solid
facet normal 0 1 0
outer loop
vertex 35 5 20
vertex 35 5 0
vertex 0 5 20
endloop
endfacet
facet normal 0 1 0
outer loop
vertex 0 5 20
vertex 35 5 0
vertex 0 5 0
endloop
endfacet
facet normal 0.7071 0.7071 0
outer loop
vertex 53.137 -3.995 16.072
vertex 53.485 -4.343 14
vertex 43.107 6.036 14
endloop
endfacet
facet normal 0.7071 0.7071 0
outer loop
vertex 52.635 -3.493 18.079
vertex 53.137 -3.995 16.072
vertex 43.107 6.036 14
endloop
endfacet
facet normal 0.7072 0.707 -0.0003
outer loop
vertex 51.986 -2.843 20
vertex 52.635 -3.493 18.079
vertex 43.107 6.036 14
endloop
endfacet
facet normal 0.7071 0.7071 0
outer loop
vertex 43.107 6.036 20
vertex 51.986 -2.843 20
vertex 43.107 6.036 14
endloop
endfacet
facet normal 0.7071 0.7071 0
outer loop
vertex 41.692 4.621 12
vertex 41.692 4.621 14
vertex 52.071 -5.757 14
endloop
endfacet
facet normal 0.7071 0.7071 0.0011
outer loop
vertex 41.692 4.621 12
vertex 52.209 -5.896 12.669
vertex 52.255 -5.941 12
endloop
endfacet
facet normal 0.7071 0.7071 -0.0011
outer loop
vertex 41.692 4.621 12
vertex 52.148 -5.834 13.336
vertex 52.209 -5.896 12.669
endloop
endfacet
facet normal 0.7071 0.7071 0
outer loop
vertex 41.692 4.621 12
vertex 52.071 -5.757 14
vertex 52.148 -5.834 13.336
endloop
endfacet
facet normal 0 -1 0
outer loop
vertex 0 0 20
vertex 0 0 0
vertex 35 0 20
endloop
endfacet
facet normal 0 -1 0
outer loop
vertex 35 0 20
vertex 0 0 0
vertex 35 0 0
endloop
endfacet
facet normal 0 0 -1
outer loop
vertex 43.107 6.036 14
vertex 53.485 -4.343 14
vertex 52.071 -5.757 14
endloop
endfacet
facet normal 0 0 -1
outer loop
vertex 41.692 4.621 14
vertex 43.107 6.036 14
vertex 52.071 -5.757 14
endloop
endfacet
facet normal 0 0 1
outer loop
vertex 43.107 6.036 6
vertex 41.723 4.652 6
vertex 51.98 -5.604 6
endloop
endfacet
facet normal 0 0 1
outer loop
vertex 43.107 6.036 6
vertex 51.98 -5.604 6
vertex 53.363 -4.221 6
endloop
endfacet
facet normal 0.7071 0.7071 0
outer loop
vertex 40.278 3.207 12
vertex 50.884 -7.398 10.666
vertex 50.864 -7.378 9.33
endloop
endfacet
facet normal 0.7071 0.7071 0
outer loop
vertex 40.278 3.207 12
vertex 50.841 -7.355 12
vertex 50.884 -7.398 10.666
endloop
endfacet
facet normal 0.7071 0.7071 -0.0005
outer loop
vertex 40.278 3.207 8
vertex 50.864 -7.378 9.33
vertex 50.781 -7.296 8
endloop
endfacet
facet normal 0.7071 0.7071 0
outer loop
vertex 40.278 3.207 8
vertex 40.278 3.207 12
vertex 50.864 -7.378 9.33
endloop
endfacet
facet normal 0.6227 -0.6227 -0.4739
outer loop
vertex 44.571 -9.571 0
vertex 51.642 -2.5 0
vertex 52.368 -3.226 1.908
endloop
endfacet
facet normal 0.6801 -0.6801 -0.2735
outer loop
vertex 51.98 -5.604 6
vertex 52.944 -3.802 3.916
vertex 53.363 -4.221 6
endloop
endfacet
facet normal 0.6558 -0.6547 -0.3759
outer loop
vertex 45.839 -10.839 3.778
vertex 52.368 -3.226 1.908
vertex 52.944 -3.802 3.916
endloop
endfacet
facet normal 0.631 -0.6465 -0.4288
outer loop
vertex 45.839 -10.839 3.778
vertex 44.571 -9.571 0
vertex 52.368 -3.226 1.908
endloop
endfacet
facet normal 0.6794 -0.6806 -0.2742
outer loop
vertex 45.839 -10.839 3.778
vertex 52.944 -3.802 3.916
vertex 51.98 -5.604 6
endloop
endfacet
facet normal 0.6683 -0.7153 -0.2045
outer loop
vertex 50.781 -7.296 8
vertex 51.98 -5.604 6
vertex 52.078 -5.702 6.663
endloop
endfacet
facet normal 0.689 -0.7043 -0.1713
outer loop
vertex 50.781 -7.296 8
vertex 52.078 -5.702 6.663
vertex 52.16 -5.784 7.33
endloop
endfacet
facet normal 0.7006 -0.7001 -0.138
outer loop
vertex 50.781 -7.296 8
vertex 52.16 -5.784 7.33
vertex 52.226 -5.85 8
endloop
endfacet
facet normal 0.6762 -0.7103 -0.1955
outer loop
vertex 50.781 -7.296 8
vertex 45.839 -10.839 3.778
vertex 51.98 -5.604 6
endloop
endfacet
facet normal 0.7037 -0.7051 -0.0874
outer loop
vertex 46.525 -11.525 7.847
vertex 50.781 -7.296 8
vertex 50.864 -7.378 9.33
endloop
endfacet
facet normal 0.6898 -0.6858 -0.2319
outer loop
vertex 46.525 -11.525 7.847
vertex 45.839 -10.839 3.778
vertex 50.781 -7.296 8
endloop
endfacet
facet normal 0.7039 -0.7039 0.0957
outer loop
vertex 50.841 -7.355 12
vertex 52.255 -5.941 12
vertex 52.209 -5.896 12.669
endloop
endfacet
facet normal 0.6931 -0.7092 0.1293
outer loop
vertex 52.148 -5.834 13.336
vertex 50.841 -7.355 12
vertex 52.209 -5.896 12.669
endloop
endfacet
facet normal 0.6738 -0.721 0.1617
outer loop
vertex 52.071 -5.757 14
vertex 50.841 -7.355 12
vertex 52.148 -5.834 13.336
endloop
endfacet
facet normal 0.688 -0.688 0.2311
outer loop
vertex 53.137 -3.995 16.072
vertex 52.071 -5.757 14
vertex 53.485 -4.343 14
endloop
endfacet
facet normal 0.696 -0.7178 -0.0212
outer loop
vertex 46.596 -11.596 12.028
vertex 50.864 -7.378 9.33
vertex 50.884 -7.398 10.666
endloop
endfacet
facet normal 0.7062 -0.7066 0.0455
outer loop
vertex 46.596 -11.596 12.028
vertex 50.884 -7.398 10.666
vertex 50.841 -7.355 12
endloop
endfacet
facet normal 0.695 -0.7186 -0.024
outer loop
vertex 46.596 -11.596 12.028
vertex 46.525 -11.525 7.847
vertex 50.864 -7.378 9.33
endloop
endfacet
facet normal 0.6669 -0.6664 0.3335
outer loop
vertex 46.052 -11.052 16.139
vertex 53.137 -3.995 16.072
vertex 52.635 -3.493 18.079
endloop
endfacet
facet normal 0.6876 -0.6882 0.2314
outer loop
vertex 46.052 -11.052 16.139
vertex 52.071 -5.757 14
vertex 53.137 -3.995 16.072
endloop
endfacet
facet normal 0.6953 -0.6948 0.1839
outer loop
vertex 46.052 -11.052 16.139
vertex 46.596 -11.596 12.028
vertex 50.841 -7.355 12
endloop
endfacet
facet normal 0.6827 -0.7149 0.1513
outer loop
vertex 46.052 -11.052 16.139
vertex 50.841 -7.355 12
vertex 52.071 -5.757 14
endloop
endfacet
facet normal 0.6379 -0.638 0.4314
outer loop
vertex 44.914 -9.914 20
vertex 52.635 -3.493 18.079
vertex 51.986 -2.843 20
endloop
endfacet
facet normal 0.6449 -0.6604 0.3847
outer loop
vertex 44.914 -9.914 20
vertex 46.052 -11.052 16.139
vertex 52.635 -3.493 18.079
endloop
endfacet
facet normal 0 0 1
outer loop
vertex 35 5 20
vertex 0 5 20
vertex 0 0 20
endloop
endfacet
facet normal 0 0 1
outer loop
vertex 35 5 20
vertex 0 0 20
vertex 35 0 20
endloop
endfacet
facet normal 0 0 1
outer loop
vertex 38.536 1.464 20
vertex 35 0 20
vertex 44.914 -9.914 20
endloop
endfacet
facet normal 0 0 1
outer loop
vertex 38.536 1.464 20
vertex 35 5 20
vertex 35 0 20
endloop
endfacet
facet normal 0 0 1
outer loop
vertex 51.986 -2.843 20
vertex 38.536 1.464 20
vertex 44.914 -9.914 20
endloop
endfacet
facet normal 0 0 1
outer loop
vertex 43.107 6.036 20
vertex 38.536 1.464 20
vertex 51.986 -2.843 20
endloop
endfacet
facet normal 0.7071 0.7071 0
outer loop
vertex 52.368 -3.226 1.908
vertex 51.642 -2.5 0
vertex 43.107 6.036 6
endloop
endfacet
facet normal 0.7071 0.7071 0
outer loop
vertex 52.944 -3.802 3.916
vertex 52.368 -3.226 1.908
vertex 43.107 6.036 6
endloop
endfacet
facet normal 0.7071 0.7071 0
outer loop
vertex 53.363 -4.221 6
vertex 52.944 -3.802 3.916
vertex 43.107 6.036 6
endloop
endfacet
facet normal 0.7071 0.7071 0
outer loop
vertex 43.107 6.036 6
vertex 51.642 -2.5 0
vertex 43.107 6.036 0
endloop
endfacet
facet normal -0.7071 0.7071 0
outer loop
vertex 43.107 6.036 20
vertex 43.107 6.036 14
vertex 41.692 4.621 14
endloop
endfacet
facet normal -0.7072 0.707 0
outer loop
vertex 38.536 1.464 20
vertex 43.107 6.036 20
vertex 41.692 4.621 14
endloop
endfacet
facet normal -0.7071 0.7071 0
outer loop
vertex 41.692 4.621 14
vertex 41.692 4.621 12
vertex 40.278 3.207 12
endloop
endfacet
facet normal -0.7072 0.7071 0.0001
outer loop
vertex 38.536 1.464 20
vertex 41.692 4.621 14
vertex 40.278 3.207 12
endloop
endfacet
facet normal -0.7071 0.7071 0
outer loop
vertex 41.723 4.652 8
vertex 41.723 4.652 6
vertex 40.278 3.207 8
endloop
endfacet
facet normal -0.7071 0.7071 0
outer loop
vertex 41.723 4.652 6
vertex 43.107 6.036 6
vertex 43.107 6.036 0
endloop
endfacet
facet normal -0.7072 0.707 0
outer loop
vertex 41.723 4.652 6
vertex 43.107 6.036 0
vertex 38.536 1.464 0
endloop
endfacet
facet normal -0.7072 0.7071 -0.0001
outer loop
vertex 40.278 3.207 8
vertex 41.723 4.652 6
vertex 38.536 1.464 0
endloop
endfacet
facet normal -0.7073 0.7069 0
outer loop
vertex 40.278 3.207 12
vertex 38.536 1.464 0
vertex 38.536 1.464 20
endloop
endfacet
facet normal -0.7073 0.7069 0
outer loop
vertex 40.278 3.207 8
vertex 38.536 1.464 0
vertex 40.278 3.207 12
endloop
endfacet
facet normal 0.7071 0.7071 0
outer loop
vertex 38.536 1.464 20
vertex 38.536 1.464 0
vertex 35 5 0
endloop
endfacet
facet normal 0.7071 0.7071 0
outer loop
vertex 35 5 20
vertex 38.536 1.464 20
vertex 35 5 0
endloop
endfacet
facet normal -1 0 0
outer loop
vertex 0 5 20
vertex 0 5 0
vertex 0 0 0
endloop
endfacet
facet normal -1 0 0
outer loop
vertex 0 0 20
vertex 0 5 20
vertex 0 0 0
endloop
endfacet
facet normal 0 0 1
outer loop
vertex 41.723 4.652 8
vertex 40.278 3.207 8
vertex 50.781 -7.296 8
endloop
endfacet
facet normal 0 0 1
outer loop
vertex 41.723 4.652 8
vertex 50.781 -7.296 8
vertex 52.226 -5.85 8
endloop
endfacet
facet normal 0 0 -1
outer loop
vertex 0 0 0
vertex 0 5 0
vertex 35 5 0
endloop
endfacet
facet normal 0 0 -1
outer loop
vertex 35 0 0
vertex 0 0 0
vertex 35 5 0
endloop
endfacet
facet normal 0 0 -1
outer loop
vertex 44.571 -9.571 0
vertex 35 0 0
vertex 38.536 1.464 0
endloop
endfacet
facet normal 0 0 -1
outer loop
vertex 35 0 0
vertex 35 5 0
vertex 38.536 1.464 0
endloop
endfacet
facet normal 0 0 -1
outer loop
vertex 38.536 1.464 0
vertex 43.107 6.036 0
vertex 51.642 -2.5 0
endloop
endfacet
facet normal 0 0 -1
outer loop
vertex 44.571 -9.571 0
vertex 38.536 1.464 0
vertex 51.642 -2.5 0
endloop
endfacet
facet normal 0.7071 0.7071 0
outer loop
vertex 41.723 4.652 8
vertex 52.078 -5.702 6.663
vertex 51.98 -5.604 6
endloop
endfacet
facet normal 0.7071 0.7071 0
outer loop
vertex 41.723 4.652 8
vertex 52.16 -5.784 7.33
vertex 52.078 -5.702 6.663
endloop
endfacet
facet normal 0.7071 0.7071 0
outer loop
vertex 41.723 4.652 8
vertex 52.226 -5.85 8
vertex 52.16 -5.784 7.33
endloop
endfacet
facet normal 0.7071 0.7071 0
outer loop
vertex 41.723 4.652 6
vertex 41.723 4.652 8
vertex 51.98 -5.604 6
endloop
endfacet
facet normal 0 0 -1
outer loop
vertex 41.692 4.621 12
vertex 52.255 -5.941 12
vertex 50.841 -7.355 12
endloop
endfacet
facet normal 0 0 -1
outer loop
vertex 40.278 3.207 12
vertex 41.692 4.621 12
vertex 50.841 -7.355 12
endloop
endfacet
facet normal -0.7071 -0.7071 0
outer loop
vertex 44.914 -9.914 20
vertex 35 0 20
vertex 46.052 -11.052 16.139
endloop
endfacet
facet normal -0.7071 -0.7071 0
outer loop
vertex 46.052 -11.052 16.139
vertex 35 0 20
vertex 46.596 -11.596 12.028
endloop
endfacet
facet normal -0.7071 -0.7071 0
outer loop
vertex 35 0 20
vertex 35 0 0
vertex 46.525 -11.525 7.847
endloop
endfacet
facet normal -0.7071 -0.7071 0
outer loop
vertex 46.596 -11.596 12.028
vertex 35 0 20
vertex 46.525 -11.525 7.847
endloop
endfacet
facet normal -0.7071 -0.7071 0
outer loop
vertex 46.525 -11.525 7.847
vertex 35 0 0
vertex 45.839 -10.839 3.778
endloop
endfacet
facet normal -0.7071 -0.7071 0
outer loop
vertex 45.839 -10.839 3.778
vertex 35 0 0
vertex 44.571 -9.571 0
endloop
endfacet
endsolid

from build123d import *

# Parameters (mm, degrees)
BOSS_EXTRUDE1_DEPTH     = 20
CUT_EXTRUDE3_DEPTH      = 50.867148527
CUT_EXTRUDE3_DEPTH_BACK = 50.867148527
CUT_EXTRUDE4_DEPTH      = 51.602966037
CUT_EXTRUDE4_DEPTH_BACK = 51.602966037


with BuildPart() as part:
    # Sketch1 → Boss-Extrude1 (new body)
    with BuildSketch(Plane.XY):
        Polygon((0, 0), (35, 0), (46.642135624, -11.642135624), (53.713203436, -4.571067812), (43.106601718, 6.035533906), (38.535533906, 1.464466094), (35, 5), (0, 5), align=None)
    extrude(amount=BOSS_EXTRUDE1_DEPTH)

    # Sketch2 → Cut-Extrude3 (cut, two sides: drawn at the far end of the back side and taken through both)
    with BuildSketch(Plane(origin=(29.142135624, -29.142135624, 0), x_dir=(0, 0, -1), z_dir=(0.7071067811865479, -0.7071067811865471, 0)).offset(-CUT_EXTRUDE3_DEPTH_BACK)):
        Polygon((-14, 135.155901118), (-14, 34.748737342), (-14, 32.748737342), (-12, 32.748737342), (-12, 30.748737342), (-8, 30.748737342), (-8, 32.792627222), (-6, 32.792627222), (-6, 34.748737342), (-6, 135.155901118), (-6, 335.970228672), (-14, 335.970228672), align=None)
    extrude(amount=CUT_EXTRUDE3_DEPTH + CUT_EXTRUDE3_DEPTH_BACK, mode=Mode.SUBTRACT)

    # Sketch4 → Cut-Extrude4 (cut, two sides: drawn at the far end of the back side and taken through both)
    with BuildSketch(Plane(origin=(24.571067812, 24.571067812, 0), x_dir=(0, 0, -1), z_dir=(0.7071067811865477, 0.7071067811865475, 0)).offset(-CUT_EXTRUDE4_DEPTH_BACK)):
        with BuildLine():
            Line((89.549076457, 16.380836563), (0, -38.283901601))
            ThreePointArc((0, -38.283901601), (-9.934867623, -41.207301416), (-20, -38.769890621))
            Line((-20, -38.769890621), (-112.098466498, 11.480911975))
            Line((-112.098466498, 11.480911975), (-107.001191072, -198.288248186))
            Line((-107.001191072, -198.288248186), (94.646351884, -193.388323598))
            Line((94.646351884, -193.388323598), (89.549076457, 16.380836563))
        make_face()
    extrude(amount=CUT_EXTRUDE4_DEPTH + CUT_EXTRUDE4_DEPTH_BACK, mode=Mode.SUBTRACT)


solid = part.part
